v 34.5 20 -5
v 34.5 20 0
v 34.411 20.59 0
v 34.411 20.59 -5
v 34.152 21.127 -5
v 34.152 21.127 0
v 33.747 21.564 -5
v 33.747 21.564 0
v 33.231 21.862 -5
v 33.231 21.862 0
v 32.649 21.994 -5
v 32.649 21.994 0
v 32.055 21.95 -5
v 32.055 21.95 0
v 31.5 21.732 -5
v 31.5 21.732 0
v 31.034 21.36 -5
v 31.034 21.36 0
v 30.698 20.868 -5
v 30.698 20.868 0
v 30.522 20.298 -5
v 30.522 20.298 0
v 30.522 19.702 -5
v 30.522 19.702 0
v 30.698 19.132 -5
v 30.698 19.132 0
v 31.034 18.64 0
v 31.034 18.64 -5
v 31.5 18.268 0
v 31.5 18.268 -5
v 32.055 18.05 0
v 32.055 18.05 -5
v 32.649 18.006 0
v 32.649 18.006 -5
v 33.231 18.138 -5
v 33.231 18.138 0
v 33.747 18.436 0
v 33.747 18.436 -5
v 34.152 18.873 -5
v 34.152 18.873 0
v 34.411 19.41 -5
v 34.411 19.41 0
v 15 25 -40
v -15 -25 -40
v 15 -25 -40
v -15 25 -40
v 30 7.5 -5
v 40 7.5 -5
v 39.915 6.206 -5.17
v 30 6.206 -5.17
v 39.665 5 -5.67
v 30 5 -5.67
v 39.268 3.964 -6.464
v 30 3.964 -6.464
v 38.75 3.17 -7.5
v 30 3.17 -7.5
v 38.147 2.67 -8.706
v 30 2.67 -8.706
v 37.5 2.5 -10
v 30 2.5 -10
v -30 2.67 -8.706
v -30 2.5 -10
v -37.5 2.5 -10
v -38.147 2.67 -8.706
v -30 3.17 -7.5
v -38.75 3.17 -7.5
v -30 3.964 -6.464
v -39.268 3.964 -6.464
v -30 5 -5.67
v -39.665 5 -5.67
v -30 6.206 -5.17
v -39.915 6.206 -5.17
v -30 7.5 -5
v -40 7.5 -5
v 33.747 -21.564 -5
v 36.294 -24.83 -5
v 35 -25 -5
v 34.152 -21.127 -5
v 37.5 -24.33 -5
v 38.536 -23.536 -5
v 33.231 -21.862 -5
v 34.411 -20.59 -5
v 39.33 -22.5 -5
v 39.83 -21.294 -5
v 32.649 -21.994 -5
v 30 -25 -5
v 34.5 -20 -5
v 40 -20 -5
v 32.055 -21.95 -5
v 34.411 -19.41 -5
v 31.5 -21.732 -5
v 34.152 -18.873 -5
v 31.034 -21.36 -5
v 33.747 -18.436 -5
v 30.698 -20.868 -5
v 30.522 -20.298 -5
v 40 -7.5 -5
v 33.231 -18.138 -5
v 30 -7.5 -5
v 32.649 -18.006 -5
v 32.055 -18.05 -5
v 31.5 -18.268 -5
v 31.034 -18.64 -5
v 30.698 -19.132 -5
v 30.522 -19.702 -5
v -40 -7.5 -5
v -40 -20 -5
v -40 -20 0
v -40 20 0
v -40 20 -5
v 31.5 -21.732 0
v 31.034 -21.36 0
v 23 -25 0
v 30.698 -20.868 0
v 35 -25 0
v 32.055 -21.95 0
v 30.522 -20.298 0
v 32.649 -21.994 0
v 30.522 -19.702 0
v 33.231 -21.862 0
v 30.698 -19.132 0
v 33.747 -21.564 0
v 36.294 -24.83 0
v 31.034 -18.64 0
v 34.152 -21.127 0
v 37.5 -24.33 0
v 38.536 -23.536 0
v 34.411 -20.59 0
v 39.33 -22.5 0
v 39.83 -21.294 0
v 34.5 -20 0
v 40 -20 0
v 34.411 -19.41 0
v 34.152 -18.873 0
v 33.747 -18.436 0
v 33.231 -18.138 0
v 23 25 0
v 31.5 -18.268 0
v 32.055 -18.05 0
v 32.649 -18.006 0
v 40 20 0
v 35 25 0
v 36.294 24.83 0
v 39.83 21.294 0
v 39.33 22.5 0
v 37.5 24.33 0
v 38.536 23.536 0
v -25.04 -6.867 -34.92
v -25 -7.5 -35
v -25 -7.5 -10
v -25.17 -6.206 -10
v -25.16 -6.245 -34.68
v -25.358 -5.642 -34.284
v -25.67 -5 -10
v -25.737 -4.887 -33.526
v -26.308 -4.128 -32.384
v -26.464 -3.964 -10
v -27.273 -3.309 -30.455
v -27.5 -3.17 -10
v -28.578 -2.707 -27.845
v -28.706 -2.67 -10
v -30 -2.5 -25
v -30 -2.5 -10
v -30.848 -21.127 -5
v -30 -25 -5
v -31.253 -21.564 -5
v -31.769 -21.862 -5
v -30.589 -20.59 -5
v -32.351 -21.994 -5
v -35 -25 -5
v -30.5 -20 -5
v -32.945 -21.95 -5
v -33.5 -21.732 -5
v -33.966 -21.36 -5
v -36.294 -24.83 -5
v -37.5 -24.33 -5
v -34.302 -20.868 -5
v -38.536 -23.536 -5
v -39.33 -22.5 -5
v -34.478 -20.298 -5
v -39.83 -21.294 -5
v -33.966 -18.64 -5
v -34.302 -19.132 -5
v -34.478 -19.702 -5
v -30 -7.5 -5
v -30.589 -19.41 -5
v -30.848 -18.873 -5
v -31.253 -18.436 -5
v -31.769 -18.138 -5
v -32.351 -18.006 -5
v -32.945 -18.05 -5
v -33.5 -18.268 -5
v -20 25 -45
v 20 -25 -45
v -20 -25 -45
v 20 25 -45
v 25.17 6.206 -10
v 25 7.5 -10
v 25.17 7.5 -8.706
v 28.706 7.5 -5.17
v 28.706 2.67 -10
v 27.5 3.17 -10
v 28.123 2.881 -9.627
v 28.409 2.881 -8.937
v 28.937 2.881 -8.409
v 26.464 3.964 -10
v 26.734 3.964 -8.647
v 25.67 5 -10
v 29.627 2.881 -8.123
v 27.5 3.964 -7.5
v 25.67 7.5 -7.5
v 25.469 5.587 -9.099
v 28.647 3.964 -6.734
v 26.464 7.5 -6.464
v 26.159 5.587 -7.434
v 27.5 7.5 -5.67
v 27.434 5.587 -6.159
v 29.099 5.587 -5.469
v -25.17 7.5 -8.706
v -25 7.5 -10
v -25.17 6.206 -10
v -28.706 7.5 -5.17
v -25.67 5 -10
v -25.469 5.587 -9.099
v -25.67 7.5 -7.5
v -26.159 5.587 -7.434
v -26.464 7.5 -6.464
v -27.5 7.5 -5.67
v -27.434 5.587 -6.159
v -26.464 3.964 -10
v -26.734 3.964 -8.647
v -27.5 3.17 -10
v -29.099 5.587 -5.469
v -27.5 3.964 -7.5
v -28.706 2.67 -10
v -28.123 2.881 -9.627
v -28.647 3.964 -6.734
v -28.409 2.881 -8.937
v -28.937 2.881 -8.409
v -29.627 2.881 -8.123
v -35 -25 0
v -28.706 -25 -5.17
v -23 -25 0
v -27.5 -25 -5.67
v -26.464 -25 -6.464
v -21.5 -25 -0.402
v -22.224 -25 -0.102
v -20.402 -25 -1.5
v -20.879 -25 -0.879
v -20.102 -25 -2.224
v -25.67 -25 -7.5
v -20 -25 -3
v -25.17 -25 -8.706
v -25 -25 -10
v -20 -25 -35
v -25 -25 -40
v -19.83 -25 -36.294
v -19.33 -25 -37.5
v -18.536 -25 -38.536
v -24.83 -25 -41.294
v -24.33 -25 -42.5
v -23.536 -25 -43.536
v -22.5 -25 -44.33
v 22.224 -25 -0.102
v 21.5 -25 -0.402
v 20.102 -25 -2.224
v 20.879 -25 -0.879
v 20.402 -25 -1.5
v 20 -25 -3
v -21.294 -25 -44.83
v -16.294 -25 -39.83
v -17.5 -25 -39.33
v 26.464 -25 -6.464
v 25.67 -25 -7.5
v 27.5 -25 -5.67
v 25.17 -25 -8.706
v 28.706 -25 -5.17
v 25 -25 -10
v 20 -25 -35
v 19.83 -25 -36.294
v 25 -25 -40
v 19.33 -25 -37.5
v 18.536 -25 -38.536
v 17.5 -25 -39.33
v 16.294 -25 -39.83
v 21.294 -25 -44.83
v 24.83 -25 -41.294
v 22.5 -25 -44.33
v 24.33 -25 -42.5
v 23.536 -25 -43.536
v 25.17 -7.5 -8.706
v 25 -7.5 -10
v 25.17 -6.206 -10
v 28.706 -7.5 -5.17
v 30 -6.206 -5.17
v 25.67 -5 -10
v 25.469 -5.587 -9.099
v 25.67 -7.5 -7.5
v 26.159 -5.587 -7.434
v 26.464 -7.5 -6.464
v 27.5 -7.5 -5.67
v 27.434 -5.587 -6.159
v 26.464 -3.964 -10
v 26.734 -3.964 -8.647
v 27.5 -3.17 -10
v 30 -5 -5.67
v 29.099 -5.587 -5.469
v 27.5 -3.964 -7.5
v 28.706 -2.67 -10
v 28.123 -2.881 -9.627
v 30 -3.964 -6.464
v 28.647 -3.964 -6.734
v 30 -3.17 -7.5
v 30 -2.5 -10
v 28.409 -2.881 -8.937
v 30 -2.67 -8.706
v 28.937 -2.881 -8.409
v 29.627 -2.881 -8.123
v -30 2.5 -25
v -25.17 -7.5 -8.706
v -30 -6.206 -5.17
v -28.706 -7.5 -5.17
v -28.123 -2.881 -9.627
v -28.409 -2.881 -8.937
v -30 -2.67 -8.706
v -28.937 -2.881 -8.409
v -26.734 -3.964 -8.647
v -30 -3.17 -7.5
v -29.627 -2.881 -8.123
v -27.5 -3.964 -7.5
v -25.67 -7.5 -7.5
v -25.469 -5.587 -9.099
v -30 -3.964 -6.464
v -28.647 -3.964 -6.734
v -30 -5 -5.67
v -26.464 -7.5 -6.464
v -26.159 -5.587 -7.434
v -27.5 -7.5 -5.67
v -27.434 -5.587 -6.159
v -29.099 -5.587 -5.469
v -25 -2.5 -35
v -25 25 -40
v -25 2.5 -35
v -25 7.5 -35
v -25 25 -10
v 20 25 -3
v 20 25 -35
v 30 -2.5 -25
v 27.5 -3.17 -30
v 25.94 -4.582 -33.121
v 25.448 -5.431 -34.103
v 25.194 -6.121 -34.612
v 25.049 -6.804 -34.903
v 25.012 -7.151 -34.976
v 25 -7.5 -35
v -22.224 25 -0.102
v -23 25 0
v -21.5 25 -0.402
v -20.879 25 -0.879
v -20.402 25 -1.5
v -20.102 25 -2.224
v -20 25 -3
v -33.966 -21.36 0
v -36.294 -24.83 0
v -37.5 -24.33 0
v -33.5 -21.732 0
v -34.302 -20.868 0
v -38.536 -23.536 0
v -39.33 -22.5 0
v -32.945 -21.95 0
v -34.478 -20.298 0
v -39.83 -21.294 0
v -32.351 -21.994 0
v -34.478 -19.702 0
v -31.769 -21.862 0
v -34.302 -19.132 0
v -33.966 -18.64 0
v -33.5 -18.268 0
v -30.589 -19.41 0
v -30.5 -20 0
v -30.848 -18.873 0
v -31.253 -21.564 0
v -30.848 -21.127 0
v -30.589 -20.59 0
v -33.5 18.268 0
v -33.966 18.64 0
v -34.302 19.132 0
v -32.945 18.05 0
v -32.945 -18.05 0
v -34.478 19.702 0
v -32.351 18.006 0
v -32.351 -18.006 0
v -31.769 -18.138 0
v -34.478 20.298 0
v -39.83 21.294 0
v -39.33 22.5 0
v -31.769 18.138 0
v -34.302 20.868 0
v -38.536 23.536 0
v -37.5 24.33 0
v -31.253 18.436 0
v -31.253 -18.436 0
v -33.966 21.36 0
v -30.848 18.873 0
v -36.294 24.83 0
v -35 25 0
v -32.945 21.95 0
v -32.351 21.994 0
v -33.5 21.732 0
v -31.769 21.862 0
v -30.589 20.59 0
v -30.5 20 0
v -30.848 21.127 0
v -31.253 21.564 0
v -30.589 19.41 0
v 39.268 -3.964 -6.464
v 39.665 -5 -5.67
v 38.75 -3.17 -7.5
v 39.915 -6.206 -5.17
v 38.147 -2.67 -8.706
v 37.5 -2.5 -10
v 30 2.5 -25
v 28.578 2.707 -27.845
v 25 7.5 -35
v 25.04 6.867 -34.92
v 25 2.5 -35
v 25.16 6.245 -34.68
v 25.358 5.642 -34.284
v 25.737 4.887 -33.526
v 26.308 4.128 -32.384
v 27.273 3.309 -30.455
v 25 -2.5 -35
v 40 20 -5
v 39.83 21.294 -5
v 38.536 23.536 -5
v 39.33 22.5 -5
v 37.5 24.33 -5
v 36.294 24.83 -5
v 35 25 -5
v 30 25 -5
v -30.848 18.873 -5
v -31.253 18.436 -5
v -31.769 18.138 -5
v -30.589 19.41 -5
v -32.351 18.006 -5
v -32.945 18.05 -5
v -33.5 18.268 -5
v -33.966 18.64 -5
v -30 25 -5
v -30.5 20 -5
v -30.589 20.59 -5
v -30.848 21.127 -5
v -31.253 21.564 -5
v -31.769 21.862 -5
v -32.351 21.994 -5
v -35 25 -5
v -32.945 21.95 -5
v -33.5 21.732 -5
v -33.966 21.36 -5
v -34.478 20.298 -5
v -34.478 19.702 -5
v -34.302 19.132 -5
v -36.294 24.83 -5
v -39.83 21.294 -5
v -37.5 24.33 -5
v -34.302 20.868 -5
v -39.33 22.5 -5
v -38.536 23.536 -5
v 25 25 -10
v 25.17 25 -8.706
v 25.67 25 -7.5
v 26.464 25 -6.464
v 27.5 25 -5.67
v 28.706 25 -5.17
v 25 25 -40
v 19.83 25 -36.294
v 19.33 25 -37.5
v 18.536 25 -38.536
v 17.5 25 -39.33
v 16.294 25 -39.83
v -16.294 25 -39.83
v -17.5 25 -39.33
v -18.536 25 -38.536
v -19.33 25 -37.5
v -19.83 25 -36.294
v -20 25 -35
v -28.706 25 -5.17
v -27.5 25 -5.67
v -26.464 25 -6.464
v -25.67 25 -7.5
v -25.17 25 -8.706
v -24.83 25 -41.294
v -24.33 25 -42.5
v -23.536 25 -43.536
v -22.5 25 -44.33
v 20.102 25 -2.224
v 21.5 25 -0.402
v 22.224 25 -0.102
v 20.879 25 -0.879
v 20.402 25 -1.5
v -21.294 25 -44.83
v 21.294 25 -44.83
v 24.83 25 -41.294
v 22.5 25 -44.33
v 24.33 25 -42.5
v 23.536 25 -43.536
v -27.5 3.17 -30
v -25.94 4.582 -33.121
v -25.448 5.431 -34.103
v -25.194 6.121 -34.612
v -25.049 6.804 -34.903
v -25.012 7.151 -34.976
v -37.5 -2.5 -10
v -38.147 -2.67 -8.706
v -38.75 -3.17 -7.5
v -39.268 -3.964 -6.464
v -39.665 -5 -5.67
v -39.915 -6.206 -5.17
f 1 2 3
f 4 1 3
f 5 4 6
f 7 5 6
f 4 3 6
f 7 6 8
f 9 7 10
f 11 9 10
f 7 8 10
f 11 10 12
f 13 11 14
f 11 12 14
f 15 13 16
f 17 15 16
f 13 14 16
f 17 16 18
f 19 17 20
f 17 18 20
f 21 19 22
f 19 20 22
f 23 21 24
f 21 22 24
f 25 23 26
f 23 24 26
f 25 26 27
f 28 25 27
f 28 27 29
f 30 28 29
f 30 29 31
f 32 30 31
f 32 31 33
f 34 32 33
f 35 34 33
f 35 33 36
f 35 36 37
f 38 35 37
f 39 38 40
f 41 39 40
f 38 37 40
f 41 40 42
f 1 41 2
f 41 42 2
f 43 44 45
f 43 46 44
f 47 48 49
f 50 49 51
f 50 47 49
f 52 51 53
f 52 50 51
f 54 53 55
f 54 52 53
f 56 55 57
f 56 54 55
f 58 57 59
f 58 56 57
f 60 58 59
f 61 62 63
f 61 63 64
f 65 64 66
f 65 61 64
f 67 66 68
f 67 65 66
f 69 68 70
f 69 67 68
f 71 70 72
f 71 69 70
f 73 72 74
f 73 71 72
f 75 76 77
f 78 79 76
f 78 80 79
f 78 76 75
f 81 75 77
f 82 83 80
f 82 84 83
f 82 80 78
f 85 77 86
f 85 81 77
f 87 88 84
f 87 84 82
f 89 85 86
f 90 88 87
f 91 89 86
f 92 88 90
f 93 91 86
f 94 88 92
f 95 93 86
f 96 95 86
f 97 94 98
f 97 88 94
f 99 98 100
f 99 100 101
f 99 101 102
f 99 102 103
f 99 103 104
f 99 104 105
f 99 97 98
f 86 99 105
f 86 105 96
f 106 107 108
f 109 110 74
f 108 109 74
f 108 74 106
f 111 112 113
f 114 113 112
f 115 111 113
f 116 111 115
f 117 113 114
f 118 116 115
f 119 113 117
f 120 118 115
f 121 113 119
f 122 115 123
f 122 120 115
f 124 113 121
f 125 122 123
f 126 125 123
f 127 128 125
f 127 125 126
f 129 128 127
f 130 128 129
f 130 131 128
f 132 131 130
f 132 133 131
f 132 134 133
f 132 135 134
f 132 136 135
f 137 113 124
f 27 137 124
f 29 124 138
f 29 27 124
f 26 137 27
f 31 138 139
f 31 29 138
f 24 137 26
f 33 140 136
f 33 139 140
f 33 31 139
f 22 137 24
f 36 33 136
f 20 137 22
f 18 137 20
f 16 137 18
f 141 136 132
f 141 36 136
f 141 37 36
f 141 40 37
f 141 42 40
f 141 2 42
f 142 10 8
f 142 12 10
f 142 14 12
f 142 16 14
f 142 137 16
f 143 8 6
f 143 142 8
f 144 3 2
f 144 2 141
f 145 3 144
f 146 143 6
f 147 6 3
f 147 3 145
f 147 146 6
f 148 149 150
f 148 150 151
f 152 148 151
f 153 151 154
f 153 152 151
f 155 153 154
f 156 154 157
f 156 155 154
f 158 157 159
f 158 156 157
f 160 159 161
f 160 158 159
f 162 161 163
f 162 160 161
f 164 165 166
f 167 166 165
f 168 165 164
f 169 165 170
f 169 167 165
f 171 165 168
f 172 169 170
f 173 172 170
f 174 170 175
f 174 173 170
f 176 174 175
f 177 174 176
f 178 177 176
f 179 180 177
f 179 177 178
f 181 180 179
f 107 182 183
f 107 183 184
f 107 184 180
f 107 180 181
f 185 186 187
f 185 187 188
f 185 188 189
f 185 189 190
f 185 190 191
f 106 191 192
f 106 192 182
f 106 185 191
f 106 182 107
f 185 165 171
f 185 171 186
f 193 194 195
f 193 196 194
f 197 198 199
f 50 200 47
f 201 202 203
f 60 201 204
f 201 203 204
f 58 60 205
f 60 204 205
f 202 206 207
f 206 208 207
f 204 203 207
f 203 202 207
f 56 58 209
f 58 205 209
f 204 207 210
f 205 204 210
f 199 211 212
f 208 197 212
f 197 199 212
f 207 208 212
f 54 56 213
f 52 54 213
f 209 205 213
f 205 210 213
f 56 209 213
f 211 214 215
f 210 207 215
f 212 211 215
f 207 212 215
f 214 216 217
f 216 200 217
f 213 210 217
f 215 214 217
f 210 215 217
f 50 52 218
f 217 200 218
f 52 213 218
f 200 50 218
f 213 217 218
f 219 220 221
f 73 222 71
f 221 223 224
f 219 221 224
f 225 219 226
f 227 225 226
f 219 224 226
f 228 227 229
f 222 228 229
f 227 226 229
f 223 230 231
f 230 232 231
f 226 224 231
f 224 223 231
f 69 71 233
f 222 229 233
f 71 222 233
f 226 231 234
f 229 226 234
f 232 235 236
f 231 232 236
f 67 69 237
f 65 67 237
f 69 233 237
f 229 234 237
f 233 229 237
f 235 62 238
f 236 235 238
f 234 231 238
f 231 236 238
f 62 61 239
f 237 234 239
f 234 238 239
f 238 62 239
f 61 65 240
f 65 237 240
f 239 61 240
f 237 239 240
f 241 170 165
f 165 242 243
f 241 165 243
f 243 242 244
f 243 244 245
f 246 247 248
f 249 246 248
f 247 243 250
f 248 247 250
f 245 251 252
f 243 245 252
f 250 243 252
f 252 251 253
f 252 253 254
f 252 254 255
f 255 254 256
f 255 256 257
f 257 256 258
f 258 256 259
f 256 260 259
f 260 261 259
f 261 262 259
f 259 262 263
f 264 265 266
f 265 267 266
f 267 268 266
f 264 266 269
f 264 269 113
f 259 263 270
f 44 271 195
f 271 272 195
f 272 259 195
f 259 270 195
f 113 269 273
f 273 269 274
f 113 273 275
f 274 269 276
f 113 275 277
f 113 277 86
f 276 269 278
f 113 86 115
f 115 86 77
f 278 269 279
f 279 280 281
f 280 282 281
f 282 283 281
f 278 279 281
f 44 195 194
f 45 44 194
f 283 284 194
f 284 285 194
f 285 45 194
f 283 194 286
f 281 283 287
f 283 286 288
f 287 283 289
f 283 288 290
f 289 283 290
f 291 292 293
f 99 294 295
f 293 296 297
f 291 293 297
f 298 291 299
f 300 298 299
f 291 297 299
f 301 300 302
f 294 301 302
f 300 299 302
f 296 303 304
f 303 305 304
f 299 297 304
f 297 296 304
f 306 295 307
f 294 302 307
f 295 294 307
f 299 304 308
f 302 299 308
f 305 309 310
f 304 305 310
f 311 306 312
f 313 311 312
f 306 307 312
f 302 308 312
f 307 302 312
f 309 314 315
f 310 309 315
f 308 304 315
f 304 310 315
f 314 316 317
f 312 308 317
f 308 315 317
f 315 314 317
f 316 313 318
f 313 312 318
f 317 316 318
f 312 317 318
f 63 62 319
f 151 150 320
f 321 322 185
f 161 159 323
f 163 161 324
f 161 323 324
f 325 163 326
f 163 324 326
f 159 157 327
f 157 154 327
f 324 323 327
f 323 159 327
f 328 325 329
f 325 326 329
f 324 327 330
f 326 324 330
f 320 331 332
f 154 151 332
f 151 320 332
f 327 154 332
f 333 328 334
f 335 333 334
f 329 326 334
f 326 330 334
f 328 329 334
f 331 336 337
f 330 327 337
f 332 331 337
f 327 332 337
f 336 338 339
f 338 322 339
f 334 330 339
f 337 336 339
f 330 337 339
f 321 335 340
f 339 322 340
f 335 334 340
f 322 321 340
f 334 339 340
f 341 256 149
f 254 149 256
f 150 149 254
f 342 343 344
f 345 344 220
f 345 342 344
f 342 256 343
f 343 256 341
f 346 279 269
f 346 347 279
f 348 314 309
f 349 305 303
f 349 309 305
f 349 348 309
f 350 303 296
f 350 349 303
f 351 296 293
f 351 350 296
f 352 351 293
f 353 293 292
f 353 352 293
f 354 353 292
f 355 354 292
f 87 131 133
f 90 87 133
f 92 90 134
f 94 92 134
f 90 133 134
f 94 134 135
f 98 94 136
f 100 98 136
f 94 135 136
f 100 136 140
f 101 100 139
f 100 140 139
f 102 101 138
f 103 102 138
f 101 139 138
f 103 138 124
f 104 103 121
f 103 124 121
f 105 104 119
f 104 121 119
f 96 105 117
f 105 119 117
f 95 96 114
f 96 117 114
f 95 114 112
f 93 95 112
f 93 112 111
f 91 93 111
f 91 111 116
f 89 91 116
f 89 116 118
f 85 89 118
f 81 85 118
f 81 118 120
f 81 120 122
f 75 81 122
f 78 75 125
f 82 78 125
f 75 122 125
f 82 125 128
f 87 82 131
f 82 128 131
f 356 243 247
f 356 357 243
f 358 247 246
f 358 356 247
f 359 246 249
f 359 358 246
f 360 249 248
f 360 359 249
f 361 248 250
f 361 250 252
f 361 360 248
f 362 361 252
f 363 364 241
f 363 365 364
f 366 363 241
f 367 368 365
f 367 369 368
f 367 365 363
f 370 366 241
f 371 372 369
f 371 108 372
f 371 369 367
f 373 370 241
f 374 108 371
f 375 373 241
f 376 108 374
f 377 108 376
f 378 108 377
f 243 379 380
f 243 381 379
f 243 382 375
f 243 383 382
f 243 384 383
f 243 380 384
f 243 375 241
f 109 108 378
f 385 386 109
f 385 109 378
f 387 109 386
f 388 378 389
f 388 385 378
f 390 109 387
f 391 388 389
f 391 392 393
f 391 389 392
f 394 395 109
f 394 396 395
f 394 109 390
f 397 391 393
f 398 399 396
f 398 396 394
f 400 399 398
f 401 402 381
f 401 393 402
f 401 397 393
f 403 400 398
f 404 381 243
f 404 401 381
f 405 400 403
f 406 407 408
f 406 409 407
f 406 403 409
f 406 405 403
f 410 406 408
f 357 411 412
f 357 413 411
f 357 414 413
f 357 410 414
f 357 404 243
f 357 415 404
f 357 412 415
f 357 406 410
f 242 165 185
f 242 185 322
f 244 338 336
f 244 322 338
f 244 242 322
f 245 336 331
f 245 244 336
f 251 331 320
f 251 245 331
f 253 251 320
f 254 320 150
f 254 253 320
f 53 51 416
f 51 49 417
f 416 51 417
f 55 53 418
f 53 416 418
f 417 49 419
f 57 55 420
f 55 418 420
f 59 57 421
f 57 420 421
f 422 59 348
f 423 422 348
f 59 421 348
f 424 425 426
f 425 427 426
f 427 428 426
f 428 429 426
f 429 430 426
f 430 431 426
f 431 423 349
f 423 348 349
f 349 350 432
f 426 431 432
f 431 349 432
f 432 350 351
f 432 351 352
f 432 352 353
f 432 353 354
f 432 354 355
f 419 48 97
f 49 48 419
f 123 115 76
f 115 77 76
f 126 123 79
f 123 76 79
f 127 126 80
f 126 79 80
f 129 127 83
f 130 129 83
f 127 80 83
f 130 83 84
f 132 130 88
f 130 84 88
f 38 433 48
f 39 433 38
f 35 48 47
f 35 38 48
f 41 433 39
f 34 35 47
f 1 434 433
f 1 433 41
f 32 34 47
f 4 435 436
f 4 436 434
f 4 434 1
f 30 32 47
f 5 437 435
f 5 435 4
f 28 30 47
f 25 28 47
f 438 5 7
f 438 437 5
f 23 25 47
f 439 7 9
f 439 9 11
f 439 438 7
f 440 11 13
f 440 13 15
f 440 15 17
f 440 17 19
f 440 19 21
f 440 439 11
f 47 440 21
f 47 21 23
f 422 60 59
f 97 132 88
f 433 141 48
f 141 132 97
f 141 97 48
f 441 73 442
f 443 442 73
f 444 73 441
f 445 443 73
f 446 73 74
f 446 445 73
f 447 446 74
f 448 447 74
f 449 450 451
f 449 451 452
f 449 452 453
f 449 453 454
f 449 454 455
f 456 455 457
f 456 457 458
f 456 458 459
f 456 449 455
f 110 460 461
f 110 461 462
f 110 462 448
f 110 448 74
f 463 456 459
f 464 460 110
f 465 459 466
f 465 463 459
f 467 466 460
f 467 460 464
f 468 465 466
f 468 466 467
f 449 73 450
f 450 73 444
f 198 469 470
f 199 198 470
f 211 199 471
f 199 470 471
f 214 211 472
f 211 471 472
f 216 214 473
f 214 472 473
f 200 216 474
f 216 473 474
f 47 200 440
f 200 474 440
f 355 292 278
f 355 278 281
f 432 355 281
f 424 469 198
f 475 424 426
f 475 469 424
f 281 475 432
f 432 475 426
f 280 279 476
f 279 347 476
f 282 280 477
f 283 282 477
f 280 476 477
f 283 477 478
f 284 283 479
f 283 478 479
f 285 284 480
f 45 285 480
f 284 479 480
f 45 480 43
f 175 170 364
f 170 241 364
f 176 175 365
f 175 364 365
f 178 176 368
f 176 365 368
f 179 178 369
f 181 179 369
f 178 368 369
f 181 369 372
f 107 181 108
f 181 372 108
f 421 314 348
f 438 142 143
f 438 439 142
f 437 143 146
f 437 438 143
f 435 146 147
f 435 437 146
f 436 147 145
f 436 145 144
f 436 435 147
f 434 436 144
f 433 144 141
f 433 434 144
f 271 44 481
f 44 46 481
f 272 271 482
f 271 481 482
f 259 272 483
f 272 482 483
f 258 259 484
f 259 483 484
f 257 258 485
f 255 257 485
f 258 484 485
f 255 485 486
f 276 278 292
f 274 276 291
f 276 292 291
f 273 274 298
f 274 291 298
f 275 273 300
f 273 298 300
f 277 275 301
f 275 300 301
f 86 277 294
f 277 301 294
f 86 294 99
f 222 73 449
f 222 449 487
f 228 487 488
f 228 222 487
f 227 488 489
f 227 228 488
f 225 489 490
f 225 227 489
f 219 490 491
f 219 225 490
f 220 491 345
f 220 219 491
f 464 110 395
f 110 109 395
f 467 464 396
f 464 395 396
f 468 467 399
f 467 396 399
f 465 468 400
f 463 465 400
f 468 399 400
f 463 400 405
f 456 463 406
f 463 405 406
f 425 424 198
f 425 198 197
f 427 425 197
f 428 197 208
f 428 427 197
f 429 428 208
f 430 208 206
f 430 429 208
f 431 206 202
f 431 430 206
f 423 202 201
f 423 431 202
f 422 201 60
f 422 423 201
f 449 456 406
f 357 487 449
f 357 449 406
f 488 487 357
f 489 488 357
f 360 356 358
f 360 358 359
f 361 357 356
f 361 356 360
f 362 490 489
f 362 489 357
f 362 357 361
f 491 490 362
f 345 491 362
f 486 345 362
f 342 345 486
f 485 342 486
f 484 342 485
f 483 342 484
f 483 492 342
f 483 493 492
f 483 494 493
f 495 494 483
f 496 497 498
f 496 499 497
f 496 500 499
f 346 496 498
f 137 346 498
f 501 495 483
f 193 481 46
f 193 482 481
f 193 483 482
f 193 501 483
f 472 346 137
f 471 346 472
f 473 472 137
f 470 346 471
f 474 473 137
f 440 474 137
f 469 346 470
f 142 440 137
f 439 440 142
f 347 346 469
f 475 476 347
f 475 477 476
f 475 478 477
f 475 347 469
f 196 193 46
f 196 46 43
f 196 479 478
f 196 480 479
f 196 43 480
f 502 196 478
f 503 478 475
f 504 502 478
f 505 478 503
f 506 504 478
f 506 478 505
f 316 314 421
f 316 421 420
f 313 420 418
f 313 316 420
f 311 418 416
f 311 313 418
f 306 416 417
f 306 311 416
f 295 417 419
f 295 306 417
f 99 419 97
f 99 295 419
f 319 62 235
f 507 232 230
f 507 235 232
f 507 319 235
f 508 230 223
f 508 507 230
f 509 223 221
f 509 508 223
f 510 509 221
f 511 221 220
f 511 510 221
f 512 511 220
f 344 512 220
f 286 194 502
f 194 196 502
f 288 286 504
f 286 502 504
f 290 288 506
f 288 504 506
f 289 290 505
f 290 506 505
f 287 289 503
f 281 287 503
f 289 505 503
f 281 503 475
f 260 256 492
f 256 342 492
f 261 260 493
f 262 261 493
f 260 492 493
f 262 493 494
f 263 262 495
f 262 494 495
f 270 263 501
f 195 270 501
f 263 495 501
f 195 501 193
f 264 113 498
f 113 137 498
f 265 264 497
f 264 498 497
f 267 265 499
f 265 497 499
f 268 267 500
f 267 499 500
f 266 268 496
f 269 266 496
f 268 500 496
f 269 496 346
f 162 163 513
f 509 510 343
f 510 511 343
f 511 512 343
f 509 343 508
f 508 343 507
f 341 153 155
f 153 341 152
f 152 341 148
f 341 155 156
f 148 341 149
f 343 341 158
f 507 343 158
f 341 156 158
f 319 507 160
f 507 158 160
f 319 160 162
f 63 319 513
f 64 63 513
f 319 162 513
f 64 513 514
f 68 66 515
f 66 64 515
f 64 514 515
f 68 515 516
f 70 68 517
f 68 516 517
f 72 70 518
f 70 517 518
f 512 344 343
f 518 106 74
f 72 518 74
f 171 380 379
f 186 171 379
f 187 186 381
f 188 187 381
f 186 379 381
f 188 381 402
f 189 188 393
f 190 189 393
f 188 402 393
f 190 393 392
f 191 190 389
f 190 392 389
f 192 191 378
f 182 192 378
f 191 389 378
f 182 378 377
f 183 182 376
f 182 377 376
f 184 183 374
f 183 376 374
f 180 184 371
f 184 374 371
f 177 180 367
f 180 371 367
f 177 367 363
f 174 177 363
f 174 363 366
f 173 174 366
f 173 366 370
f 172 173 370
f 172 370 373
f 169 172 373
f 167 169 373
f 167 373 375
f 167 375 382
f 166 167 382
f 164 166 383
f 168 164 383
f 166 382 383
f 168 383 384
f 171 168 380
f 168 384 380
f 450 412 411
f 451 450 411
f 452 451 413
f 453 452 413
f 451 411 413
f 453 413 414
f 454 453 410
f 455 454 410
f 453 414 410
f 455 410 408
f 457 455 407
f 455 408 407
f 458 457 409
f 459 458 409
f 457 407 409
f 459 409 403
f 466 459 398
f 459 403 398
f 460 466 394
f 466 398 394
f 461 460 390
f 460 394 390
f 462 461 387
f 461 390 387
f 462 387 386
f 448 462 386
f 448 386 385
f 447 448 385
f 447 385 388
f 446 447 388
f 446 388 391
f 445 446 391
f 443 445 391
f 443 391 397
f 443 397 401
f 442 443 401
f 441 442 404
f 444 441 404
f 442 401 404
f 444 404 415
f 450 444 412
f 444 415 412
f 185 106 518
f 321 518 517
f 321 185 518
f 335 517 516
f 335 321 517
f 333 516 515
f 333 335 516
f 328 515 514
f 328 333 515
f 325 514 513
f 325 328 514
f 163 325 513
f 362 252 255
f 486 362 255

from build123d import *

# Parameters (mm, degrees)
BOSS_EXTRUDE1_DEPTH = 25
FILLET1_R           = 5
SKETCH2_R           = 2
CUT_EXTRUDE1_DEPTH  = 5
FILLET2_R           = 5
BOSS_EXTRUDE2_DEPTH = 2.5
FILLET3_R           = 5
FILLET4_R           = 3


with BuildPart() as part:
    # Sketch1 → Boss-Extrude1 (new, symmetric)
    with BuildSketch(Plane(origin=(0, 0, 0), x_dir=(1, 0, 0), z_dir=(0, 1, 0))):
        Polygon((-40, 0), (-20, 0), (-20, 40), (20, 40), (20, 0), (40, 0), (40, 5), (25, 5), (25, 45), (-25, 45), (-25, 5), (-40, 5), align=None)
    extrude(amount=BOSS_EXTRUDE1_DEPTH, both=True)

    # Fillet1
    fillet1_edges = [part.edges().sort_by_distance(p)[0] for p in [
        (-25, 0, -5),
        (-25, 0, -45),
        (25, 0, -45),
        (25, 0, -5),
        (20, 0, -40),
        (-20, 0, -40),
    ]]
    fillet(fillet1_edges, radius=FILLET1_R)

    # Sketch2 → Cut-Extrude1 (cut)
    with BuildSketch(Plane.XY):
        with Locations((-32.5, 20)):
            Circle(SKETCH2_R)
        with Locations((-32.5, -20)):
            Circle(SKETCH2_R)
        with Locations((32.5, -20)):
            Circle(SKETCH2_R)
        with Locations((32.5, 20)):
            Circle(SKETCH2_R)
    extrude(amount=-CUT_EXTRUDE1_DEPTH, mode=Mode.SUBTRACT)

    # Fillet2
    fillet2_edges = [part.edges().sort_by_distance(p)[0] for p in [
        (40, -25, -2.5),
        (-40, -25, -2.5),
        (40, 25, -2.5),
        (-40, 25, -2.5),
    ]]
    fillet(fillet2_edges, radius=FILLET2_R)

    # Sketch3 → Boss-Extrude2 (add, symmetric)
    with BuildSketch(Plane(origin=(0, 0, 0), x_dir=(1, 0, 0), z_dir=(0, 1, 0))):
        Polygon((-40, 5), (-25, 35), (-25, 5), align=None)
    boss_extrude2 = extrude(amount=BOSS_EXTRUDE2_DEPTH, both=True)

    # Mirror5: Boss-Extrude2 across plane
    add(boss_extrude2.mirror(Plane(origin=(0, 0, 0), x_dir=(0, 0, 1), z_dir=(1, 0, 0))))

    # Fillet3
    # the kernel refuses this fillet: 5 mm, written as the material it adds along each edge
    with BuildSketch(Plane(origin=(-30, -2.5, -10), x_dir=(1, 0, 0), z_dir=(0, 0, -1))) as fillet3_piece_1:
        with BuildLine():
            CenterArc((5 - FILLET3_R, FILLET3_R), FILLET3_R, 270, 90)
            Line((5 - FILLET3_R, 0), (5, 0))
            Line((5, 0), (5, FILLET3_R))
        make_face()
    revolve(axis=Axis((-30, -2.5, -10), (0, -1, 0)), revolution_arc=90)
    with BuildSketch(Plane(origin=(-30, 2.5, -10), x_dir=(1, 0, 0), z_dir=(0, 0, -1))) as fillet3_piece_2:
        with BuildLine():
            CenterArc((5 - FILLET3_R, -FILLET3_R), FILLET3_R, 0, 90)
            Line((5 - FILLET3_R, 0), (5, 0))
            Line((5, 0), (5, -FILLET3_R))
        make_face()
    revolve(axis=Axis((-30, 2.5, -10), (0, -1, 0)), revolution_arc=90)
    with BuildSketch(Plane(origin=(-25, -2.5, -47.5), x_dir=(-1, 0, 0), z_dir=(0, 0, 1))) as fillet3_piece_3_section:
        with BuildLine():
            CenterArc((FILLET3_R, FILLET3_R), FILLET3_R, 180, 90)
            Line((0, FILLET3_R), (0, 0))
            Line((0, 0), (FILLET3_R, 0))
        make_face()
    fillet3_piece_3 = extrude(amount=37.5, mode=Mode.PRIVATE)
    fillet3_piece_3 = split(fillet3_piece_3, bisect_by=Plane(origin=(-30.617859864, -3.692357018, -23.764280273), z_dir=(0.894427190999916, 0, 0.44721359549995787)), keep=Keep.TOP, mode=Mode.PRIVATE)
    add(fillet3_piece_3)
    with BuildSketch(Plane(origin=(-25, 2.5, -47.5), x_dir=(0, 1, 0), z_dir=(0, 0, 1))) as fillet3_piece_4_section:
        with BuildLine():
            CenterArc((FILLET3_R, FILLET3_R), FILLET3_R, 180, 90)
            Line((0, FILLET3_R), (0, 0))
            Line((0, 0), (FILLET3_R, 0))
        make_face()
    fillet3_piece_4 = extrude(amount=37.5, mode=Mode.PRIVATE)
    fillet3_piece_4 = split(fillet3_piece_4, bisect_by=Plane(origin=(-30.617859864, 3.692357018, -23.764280273), z_dir=(0.894427190999916, 0, 0.44721359549995787)), keep=Keep.TOP, mode=Mode.PRIVATE)
    add(fillet3_piece_4)
    with BuildSketch(Plane(origin=(-30, 2.5, -5), x_dir=(0, 1, 0), z_dir=(-1, 0, 0))) as fillet3_piece_5_section:
        with BuildLine():
            CenterArc((FILLET3_R, FILLET3_R), FILLET3_R, 180, 90)
            Line((0, FILLET3_R), (0, 0))
            Line((0, 0), (FILLET3_R, 0))
        make_face()
    fillet3_piece_5 = extrude(amount=10, mode=Mode.PRIVATE)
    fillet3_piece_5 = split(fillet3_piece_5, bisect_by=Plane(origin=(-38.518002001, 3.668083757, -7.963995998), z_dir=(0.894427190999916, 0, 0.44721359549995787)), keep=Keep.TOP, mode=Mode.PRIVATE)
    add(fillet3_piece_5)
    with BuildSketch(Plane(origin=(-30, -2.5, -5), x_dir=(0, -1, 0), z_dir=(-1, 0, 0))) as fillet3_piece_6_section:
        with BuildLine():
            CenterArc((FILLET3_R, -FILLET3_R), FILLET3_R, 90, 90)
            Line((0, -FILLET3_R), (0, 0))
            Line((0, 0), (FILLET3_R, 0))
        make_face()
    fillet3_piece_6 = extrude(amount=10, mode=Mode.PRIVATE)
    fillet3_piece_6 = split(fillet3_piece_6, bisect_by=Plane(origin=(-38.518002001, -3.668083757, -7.963995998), z_dir=(0.894427190999916, 0, 0.44721359549995787)), keep=Keep.TOP, mode=Mode.PRIVATE)
    add(fillet3_piece_6)
    with BuildSketch(Plane(origin=(30, -2.5, -10), x_dir=(-1, 0, 0), z_dir=(0, 0, -1))) as fillet3_piece_7:
        with BuildLine():
            CenterArc((5 - FILLET3_R, -FILLET3_R), FILLET3_R, 0, 90)
            Line((5 - FILLET3_R, 0), (5, 0))
            Line((5, 0), (5, -FILLET3_R))
        make_face()
    revolve(axis=Axis((30, -2.5, -10), (0, 1, 0)), revolution_arc=90)
    with BuildSketch(Plane(origin=(30, 2.5, -10), x_dir=(-1, 0, 0), z_dir=(0, 0, -1))) as fillet3_piece_8:
        with BuildLine():
            CenterArc((5 - FILLET3_R, FILLET3_R), FILLET3_R, 270, 90)
            Line((5, FILLET3_R), (5, 0))
            Line((5, 0), (5 - FILLET3_R, 0))
        make_face()
    revolve(axis=Axis((30, 2.5, -10), (0, 1, 0)), revolution_arc=90)
    with BuildSketch(Plane(origin=(25, 2.5, -47.5), x_dir=(0, 1, 0), z_dir=(0, 0, 1))) as fillet3_piece_9_section:
        with BuildLine():
            CenterArc((FILLET3_R, -FILLET3_R), FILLET3_R, 90, 90)
            Line((0, -FILLET3_R), (0, 0))
            Line((0, 0), (FILLET3_R, 0))
        make_face()
    fillet3_piece_9 = extrude(amount=37.5, mode=Mode.PRIVATE)
    fillet3_piece_9 = split(fillet3_piece_9, bisect_by=Plane(origin=(30.617859864, 3.692357018, -23.764280273), z_dir=(-0.894427190999916, 0, 0.44721359549995787)), keep=Keep.TOP, mode=Mode.PRIVATE)
    add(fillet3_piece_9)
    with BuildSketch(Plane(origin=(30, -2.5, -5), x_dir=(0, -1, 0), z_dir=(1, 0, 0))) as fillet3_piece_10_section:
        with BuildLine():
            CenterArc((FILLET3_R, FILLET3_R), FILLET3_R, 180, 90)
            Line((0, FILLET3_R), (0, 0))
            Line((0, 0), (FILLET3_R, 0))
        make_face()
    fillet3_piece_10 = extrude(amount=10, mode=Mode.PRIVATE)
    fillet3_piece_10 = split(fillet3_piece_10, bisect_by=Plane(origin=(38.518002001, -3.668083757, -7.963995998), z_dir=(-0.894427190999916, 0, 0.44721359549995787)), keep=Keep.TOP, mode=Mode.PRIVATE)
    add(fillet3_piece_10)
    with BuildSketch(Plane(origin=(25, -2.5, -47.5), x_dir=(0, -1, 0), z_dir=(0, 0, 1))) as fillet3_piece_11_section:
        with BuildLine():
            CenterArc((FILLET3_R, FILLET3_R), FILLET3_R, 180, 90)
            Line((0, FILLET3_R), (0, 0))
            Line((0, 0), (FILLET3_R, 0))
        make_face()
    fillet3_piece_11 = extrude(amount=37.5, mode=Mode.PRIVATE)
    fillet3_piece_11 = split(fillet3_piece_11, bisect_by=Plane(origin=(30.617859864, -3.692357018, -23.764280273), z_dir=(-0.894427190999916, 0, 0.44721359549995787)), keep=Keep.TOP, mode=Mode.PRIVATE)
    add(fillet3_piece_11)
    with BuildSketch(Plane(origin=(30, 2.5, -5), x_dir=(0, 0, -1), z_dir=(1, 0, 0))) as fillet3_piece_12_section:
        with BuildLine():
            CenterArc((FILLET3_R, FILLET3_R), FILLET3_R, 180, 90)
            Line((0, FILLET3_R), (0, 0))
            Line((0, 0), (FILLET3_R, 0))
        make_face()
    fillet3_piece_12 = extrude(amount=10, mode=Mode.PRIVATE)
    fillet3_piece_12 = split(fillet3_piece_12, bisect_by=Plane(origin=(38.518002001, 3.668083757, -7.963995998), z_dir=(-0.894427190999916, 0, 0.44721359549995787)), keep=Keep.TOP, mode=Mode.PRIVATE)
    add(fillet3_piece_12)

    # Fillet4
    fillet4_edges = [part.edges().sort_by_distance(p)[0] for p in [
        (20, 0, 0),
        (-20, 0, 0),
    ]]
    fillet(fillet4_edges, radius=FILLET4_R)


solid = part.part
